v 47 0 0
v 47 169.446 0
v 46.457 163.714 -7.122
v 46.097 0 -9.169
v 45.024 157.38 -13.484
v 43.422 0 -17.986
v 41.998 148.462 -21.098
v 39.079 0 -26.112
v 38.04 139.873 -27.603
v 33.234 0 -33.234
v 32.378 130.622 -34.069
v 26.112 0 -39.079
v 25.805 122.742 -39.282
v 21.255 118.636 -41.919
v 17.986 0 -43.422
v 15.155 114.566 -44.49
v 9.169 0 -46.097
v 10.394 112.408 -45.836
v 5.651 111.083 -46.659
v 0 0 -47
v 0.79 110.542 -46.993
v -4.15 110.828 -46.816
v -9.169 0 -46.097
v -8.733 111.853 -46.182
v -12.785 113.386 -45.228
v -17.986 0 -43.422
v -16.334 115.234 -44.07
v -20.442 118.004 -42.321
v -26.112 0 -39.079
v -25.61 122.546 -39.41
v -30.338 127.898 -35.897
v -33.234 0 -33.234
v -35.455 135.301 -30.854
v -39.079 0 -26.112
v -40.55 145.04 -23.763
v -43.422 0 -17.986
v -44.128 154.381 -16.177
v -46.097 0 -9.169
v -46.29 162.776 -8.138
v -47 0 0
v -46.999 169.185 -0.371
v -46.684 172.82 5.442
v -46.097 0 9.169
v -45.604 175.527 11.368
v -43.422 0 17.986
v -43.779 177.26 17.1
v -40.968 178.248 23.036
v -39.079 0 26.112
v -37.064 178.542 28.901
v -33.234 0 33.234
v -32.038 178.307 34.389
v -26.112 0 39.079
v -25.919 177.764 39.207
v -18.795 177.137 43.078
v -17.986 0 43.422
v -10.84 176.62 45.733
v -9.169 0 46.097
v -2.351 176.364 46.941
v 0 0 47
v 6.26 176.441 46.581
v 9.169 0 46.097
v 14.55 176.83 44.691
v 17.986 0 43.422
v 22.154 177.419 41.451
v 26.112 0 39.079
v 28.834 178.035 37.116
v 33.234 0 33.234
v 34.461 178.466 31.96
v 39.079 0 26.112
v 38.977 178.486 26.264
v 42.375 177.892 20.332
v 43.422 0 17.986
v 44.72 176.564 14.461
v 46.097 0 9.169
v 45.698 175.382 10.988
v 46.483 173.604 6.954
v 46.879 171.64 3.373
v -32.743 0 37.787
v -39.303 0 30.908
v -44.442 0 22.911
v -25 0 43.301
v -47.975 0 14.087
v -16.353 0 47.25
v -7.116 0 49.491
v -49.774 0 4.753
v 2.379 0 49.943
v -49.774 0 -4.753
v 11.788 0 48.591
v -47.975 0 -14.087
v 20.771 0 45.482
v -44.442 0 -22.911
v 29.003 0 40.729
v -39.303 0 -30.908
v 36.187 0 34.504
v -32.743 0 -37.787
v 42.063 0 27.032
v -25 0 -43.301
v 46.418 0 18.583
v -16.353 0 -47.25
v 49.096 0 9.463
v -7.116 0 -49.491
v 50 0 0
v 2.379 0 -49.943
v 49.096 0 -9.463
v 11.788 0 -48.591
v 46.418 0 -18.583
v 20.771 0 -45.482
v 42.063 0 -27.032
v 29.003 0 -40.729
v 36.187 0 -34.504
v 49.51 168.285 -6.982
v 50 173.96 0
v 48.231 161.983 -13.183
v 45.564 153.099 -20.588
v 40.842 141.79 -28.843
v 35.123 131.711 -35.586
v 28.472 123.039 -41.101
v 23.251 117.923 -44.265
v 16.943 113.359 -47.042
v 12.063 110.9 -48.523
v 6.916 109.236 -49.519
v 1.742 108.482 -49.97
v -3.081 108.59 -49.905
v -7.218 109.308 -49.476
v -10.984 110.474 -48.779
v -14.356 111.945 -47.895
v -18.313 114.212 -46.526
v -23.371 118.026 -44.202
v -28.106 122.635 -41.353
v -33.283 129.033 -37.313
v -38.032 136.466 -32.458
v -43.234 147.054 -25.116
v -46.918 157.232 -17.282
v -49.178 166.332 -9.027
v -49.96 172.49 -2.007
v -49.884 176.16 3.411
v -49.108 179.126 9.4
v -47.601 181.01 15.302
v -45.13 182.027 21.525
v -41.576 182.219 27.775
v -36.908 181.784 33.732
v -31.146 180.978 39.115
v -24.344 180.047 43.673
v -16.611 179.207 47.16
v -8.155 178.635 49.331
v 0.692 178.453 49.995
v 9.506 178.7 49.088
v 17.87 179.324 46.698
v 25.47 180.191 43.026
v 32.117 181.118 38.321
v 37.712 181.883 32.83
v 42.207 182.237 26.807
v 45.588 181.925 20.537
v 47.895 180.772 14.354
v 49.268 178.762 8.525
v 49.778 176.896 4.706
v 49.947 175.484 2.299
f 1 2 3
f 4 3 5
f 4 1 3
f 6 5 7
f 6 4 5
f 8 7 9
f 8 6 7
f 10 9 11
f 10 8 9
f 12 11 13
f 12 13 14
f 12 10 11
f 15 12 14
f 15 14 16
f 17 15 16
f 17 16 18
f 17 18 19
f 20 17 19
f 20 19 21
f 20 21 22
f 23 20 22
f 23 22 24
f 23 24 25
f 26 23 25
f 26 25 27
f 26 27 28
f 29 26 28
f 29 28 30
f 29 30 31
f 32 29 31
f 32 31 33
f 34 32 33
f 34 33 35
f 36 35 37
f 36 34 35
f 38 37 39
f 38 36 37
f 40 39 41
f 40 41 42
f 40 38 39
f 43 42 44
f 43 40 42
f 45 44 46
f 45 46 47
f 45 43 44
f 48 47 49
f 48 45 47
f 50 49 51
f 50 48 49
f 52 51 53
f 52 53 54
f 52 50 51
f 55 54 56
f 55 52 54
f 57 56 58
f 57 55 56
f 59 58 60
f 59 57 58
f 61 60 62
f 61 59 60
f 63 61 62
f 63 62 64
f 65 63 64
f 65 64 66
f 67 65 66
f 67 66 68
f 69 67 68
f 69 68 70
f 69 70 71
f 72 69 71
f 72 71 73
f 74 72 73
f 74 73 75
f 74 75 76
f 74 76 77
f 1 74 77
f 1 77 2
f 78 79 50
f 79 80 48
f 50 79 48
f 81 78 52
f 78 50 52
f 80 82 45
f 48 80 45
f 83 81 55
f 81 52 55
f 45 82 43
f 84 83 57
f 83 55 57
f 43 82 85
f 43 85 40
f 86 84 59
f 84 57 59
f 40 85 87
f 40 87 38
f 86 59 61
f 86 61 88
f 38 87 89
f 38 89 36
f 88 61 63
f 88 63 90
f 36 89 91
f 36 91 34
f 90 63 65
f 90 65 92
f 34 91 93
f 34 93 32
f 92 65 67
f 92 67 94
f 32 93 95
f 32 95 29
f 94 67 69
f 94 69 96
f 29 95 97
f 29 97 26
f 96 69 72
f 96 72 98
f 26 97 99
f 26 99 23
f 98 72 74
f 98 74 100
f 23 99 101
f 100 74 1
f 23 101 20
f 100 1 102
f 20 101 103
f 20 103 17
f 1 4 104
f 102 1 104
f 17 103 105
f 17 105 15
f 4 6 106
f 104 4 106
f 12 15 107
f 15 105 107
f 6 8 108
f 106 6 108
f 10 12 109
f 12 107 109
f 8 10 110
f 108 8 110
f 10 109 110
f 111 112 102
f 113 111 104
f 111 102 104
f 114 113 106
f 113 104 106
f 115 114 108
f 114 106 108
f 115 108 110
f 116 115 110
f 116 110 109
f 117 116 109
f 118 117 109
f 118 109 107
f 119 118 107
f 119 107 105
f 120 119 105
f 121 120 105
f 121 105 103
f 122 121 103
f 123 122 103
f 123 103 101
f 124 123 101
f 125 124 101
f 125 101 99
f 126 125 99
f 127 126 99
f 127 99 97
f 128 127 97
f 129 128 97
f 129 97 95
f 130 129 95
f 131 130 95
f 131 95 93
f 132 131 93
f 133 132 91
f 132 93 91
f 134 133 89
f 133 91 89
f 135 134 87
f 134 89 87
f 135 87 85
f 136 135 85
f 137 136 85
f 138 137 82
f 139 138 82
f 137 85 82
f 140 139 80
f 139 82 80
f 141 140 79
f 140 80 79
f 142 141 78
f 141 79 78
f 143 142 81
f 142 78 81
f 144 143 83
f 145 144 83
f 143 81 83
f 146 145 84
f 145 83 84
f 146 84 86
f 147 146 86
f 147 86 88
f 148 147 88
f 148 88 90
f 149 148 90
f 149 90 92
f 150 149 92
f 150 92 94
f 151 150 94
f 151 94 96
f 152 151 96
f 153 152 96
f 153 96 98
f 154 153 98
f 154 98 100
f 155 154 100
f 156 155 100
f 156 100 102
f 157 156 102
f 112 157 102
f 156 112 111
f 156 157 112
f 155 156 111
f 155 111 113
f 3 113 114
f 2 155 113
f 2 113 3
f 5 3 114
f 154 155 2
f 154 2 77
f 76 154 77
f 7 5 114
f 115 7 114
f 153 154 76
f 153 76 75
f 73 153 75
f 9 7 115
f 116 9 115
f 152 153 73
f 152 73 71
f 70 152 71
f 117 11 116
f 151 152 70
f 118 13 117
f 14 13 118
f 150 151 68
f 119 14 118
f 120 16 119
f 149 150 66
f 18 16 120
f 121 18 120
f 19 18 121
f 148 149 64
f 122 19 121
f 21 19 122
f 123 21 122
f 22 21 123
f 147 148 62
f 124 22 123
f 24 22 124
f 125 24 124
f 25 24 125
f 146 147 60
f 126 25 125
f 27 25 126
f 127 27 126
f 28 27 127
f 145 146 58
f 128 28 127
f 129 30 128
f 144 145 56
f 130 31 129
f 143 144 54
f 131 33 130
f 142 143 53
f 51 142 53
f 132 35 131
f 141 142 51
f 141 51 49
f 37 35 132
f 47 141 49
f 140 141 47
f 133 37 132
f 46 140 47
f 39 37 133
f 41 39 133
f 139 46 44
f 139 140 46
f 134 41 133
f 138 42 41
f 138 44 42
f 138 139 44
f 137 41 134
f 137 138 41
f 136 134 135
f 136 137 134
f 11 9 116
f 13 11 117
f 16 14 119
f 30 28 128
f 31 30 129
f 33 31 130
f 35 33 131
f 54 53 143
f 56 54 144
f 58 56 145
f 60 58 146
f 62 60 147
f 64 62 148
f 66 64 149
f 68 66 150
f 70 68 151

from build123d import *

# Parameters (mm, degrees)
EXTRUDE_1_OUTLINE_R      = 50
EXTRUDE_1_OUTLINE_R_2    = 47
EXTRUDE_1_DEPTH          = 200
CUT_EXTRUDE_1_DEPTH      = 213.132034356
CUT_EXTRUDE_1_DEPTH_BACK = 213.132034356
SKETCH_2_R               = 62.5


# Read off the part's stored shape, not the designer's step: Вытянуть-Тонкостенный1
with BuildPart() as part:
    # Вытянуть-Тонкостенный1 outline → Вытянуть-Тонкостенный1 (new body)
    with BuildSketch(Plane(origin=(0, 0, 0), x_dir=(1, 0, 0), z_dir=(0, 1, 0))):
        Circle(EXTRUDE_1_OUTLINE_R)
        Circle(EXTRUDE_1_OUTLINE_R_2, mode=Mode.SUBTRACT)
    extrude(amount=EXTRUDE_1_DEPTH)

    # Эскиз2 → Вырез-Вытянуть1 (cut, two sides: drawn at the far end of the back side and taken through both)
    with BuildSketch(Plane(origin=(0, 0, 0), x_dir=(1, 0, 0), z_dir=(0, -0.5735764363510444, -0.819152044288993)).offset(-CUT_EXTRUDE_1_DEPTH_BACK)):
        with Locations((0, -180)):
            Circle(SKETCH_2_R)
    extrude(amount=CUT_EXTRUDE_1_DEPTH + CUT_EXTRUDE_1_DEPTH_BACK, mode=Mode.SUBTRACT)


solid = part.part
